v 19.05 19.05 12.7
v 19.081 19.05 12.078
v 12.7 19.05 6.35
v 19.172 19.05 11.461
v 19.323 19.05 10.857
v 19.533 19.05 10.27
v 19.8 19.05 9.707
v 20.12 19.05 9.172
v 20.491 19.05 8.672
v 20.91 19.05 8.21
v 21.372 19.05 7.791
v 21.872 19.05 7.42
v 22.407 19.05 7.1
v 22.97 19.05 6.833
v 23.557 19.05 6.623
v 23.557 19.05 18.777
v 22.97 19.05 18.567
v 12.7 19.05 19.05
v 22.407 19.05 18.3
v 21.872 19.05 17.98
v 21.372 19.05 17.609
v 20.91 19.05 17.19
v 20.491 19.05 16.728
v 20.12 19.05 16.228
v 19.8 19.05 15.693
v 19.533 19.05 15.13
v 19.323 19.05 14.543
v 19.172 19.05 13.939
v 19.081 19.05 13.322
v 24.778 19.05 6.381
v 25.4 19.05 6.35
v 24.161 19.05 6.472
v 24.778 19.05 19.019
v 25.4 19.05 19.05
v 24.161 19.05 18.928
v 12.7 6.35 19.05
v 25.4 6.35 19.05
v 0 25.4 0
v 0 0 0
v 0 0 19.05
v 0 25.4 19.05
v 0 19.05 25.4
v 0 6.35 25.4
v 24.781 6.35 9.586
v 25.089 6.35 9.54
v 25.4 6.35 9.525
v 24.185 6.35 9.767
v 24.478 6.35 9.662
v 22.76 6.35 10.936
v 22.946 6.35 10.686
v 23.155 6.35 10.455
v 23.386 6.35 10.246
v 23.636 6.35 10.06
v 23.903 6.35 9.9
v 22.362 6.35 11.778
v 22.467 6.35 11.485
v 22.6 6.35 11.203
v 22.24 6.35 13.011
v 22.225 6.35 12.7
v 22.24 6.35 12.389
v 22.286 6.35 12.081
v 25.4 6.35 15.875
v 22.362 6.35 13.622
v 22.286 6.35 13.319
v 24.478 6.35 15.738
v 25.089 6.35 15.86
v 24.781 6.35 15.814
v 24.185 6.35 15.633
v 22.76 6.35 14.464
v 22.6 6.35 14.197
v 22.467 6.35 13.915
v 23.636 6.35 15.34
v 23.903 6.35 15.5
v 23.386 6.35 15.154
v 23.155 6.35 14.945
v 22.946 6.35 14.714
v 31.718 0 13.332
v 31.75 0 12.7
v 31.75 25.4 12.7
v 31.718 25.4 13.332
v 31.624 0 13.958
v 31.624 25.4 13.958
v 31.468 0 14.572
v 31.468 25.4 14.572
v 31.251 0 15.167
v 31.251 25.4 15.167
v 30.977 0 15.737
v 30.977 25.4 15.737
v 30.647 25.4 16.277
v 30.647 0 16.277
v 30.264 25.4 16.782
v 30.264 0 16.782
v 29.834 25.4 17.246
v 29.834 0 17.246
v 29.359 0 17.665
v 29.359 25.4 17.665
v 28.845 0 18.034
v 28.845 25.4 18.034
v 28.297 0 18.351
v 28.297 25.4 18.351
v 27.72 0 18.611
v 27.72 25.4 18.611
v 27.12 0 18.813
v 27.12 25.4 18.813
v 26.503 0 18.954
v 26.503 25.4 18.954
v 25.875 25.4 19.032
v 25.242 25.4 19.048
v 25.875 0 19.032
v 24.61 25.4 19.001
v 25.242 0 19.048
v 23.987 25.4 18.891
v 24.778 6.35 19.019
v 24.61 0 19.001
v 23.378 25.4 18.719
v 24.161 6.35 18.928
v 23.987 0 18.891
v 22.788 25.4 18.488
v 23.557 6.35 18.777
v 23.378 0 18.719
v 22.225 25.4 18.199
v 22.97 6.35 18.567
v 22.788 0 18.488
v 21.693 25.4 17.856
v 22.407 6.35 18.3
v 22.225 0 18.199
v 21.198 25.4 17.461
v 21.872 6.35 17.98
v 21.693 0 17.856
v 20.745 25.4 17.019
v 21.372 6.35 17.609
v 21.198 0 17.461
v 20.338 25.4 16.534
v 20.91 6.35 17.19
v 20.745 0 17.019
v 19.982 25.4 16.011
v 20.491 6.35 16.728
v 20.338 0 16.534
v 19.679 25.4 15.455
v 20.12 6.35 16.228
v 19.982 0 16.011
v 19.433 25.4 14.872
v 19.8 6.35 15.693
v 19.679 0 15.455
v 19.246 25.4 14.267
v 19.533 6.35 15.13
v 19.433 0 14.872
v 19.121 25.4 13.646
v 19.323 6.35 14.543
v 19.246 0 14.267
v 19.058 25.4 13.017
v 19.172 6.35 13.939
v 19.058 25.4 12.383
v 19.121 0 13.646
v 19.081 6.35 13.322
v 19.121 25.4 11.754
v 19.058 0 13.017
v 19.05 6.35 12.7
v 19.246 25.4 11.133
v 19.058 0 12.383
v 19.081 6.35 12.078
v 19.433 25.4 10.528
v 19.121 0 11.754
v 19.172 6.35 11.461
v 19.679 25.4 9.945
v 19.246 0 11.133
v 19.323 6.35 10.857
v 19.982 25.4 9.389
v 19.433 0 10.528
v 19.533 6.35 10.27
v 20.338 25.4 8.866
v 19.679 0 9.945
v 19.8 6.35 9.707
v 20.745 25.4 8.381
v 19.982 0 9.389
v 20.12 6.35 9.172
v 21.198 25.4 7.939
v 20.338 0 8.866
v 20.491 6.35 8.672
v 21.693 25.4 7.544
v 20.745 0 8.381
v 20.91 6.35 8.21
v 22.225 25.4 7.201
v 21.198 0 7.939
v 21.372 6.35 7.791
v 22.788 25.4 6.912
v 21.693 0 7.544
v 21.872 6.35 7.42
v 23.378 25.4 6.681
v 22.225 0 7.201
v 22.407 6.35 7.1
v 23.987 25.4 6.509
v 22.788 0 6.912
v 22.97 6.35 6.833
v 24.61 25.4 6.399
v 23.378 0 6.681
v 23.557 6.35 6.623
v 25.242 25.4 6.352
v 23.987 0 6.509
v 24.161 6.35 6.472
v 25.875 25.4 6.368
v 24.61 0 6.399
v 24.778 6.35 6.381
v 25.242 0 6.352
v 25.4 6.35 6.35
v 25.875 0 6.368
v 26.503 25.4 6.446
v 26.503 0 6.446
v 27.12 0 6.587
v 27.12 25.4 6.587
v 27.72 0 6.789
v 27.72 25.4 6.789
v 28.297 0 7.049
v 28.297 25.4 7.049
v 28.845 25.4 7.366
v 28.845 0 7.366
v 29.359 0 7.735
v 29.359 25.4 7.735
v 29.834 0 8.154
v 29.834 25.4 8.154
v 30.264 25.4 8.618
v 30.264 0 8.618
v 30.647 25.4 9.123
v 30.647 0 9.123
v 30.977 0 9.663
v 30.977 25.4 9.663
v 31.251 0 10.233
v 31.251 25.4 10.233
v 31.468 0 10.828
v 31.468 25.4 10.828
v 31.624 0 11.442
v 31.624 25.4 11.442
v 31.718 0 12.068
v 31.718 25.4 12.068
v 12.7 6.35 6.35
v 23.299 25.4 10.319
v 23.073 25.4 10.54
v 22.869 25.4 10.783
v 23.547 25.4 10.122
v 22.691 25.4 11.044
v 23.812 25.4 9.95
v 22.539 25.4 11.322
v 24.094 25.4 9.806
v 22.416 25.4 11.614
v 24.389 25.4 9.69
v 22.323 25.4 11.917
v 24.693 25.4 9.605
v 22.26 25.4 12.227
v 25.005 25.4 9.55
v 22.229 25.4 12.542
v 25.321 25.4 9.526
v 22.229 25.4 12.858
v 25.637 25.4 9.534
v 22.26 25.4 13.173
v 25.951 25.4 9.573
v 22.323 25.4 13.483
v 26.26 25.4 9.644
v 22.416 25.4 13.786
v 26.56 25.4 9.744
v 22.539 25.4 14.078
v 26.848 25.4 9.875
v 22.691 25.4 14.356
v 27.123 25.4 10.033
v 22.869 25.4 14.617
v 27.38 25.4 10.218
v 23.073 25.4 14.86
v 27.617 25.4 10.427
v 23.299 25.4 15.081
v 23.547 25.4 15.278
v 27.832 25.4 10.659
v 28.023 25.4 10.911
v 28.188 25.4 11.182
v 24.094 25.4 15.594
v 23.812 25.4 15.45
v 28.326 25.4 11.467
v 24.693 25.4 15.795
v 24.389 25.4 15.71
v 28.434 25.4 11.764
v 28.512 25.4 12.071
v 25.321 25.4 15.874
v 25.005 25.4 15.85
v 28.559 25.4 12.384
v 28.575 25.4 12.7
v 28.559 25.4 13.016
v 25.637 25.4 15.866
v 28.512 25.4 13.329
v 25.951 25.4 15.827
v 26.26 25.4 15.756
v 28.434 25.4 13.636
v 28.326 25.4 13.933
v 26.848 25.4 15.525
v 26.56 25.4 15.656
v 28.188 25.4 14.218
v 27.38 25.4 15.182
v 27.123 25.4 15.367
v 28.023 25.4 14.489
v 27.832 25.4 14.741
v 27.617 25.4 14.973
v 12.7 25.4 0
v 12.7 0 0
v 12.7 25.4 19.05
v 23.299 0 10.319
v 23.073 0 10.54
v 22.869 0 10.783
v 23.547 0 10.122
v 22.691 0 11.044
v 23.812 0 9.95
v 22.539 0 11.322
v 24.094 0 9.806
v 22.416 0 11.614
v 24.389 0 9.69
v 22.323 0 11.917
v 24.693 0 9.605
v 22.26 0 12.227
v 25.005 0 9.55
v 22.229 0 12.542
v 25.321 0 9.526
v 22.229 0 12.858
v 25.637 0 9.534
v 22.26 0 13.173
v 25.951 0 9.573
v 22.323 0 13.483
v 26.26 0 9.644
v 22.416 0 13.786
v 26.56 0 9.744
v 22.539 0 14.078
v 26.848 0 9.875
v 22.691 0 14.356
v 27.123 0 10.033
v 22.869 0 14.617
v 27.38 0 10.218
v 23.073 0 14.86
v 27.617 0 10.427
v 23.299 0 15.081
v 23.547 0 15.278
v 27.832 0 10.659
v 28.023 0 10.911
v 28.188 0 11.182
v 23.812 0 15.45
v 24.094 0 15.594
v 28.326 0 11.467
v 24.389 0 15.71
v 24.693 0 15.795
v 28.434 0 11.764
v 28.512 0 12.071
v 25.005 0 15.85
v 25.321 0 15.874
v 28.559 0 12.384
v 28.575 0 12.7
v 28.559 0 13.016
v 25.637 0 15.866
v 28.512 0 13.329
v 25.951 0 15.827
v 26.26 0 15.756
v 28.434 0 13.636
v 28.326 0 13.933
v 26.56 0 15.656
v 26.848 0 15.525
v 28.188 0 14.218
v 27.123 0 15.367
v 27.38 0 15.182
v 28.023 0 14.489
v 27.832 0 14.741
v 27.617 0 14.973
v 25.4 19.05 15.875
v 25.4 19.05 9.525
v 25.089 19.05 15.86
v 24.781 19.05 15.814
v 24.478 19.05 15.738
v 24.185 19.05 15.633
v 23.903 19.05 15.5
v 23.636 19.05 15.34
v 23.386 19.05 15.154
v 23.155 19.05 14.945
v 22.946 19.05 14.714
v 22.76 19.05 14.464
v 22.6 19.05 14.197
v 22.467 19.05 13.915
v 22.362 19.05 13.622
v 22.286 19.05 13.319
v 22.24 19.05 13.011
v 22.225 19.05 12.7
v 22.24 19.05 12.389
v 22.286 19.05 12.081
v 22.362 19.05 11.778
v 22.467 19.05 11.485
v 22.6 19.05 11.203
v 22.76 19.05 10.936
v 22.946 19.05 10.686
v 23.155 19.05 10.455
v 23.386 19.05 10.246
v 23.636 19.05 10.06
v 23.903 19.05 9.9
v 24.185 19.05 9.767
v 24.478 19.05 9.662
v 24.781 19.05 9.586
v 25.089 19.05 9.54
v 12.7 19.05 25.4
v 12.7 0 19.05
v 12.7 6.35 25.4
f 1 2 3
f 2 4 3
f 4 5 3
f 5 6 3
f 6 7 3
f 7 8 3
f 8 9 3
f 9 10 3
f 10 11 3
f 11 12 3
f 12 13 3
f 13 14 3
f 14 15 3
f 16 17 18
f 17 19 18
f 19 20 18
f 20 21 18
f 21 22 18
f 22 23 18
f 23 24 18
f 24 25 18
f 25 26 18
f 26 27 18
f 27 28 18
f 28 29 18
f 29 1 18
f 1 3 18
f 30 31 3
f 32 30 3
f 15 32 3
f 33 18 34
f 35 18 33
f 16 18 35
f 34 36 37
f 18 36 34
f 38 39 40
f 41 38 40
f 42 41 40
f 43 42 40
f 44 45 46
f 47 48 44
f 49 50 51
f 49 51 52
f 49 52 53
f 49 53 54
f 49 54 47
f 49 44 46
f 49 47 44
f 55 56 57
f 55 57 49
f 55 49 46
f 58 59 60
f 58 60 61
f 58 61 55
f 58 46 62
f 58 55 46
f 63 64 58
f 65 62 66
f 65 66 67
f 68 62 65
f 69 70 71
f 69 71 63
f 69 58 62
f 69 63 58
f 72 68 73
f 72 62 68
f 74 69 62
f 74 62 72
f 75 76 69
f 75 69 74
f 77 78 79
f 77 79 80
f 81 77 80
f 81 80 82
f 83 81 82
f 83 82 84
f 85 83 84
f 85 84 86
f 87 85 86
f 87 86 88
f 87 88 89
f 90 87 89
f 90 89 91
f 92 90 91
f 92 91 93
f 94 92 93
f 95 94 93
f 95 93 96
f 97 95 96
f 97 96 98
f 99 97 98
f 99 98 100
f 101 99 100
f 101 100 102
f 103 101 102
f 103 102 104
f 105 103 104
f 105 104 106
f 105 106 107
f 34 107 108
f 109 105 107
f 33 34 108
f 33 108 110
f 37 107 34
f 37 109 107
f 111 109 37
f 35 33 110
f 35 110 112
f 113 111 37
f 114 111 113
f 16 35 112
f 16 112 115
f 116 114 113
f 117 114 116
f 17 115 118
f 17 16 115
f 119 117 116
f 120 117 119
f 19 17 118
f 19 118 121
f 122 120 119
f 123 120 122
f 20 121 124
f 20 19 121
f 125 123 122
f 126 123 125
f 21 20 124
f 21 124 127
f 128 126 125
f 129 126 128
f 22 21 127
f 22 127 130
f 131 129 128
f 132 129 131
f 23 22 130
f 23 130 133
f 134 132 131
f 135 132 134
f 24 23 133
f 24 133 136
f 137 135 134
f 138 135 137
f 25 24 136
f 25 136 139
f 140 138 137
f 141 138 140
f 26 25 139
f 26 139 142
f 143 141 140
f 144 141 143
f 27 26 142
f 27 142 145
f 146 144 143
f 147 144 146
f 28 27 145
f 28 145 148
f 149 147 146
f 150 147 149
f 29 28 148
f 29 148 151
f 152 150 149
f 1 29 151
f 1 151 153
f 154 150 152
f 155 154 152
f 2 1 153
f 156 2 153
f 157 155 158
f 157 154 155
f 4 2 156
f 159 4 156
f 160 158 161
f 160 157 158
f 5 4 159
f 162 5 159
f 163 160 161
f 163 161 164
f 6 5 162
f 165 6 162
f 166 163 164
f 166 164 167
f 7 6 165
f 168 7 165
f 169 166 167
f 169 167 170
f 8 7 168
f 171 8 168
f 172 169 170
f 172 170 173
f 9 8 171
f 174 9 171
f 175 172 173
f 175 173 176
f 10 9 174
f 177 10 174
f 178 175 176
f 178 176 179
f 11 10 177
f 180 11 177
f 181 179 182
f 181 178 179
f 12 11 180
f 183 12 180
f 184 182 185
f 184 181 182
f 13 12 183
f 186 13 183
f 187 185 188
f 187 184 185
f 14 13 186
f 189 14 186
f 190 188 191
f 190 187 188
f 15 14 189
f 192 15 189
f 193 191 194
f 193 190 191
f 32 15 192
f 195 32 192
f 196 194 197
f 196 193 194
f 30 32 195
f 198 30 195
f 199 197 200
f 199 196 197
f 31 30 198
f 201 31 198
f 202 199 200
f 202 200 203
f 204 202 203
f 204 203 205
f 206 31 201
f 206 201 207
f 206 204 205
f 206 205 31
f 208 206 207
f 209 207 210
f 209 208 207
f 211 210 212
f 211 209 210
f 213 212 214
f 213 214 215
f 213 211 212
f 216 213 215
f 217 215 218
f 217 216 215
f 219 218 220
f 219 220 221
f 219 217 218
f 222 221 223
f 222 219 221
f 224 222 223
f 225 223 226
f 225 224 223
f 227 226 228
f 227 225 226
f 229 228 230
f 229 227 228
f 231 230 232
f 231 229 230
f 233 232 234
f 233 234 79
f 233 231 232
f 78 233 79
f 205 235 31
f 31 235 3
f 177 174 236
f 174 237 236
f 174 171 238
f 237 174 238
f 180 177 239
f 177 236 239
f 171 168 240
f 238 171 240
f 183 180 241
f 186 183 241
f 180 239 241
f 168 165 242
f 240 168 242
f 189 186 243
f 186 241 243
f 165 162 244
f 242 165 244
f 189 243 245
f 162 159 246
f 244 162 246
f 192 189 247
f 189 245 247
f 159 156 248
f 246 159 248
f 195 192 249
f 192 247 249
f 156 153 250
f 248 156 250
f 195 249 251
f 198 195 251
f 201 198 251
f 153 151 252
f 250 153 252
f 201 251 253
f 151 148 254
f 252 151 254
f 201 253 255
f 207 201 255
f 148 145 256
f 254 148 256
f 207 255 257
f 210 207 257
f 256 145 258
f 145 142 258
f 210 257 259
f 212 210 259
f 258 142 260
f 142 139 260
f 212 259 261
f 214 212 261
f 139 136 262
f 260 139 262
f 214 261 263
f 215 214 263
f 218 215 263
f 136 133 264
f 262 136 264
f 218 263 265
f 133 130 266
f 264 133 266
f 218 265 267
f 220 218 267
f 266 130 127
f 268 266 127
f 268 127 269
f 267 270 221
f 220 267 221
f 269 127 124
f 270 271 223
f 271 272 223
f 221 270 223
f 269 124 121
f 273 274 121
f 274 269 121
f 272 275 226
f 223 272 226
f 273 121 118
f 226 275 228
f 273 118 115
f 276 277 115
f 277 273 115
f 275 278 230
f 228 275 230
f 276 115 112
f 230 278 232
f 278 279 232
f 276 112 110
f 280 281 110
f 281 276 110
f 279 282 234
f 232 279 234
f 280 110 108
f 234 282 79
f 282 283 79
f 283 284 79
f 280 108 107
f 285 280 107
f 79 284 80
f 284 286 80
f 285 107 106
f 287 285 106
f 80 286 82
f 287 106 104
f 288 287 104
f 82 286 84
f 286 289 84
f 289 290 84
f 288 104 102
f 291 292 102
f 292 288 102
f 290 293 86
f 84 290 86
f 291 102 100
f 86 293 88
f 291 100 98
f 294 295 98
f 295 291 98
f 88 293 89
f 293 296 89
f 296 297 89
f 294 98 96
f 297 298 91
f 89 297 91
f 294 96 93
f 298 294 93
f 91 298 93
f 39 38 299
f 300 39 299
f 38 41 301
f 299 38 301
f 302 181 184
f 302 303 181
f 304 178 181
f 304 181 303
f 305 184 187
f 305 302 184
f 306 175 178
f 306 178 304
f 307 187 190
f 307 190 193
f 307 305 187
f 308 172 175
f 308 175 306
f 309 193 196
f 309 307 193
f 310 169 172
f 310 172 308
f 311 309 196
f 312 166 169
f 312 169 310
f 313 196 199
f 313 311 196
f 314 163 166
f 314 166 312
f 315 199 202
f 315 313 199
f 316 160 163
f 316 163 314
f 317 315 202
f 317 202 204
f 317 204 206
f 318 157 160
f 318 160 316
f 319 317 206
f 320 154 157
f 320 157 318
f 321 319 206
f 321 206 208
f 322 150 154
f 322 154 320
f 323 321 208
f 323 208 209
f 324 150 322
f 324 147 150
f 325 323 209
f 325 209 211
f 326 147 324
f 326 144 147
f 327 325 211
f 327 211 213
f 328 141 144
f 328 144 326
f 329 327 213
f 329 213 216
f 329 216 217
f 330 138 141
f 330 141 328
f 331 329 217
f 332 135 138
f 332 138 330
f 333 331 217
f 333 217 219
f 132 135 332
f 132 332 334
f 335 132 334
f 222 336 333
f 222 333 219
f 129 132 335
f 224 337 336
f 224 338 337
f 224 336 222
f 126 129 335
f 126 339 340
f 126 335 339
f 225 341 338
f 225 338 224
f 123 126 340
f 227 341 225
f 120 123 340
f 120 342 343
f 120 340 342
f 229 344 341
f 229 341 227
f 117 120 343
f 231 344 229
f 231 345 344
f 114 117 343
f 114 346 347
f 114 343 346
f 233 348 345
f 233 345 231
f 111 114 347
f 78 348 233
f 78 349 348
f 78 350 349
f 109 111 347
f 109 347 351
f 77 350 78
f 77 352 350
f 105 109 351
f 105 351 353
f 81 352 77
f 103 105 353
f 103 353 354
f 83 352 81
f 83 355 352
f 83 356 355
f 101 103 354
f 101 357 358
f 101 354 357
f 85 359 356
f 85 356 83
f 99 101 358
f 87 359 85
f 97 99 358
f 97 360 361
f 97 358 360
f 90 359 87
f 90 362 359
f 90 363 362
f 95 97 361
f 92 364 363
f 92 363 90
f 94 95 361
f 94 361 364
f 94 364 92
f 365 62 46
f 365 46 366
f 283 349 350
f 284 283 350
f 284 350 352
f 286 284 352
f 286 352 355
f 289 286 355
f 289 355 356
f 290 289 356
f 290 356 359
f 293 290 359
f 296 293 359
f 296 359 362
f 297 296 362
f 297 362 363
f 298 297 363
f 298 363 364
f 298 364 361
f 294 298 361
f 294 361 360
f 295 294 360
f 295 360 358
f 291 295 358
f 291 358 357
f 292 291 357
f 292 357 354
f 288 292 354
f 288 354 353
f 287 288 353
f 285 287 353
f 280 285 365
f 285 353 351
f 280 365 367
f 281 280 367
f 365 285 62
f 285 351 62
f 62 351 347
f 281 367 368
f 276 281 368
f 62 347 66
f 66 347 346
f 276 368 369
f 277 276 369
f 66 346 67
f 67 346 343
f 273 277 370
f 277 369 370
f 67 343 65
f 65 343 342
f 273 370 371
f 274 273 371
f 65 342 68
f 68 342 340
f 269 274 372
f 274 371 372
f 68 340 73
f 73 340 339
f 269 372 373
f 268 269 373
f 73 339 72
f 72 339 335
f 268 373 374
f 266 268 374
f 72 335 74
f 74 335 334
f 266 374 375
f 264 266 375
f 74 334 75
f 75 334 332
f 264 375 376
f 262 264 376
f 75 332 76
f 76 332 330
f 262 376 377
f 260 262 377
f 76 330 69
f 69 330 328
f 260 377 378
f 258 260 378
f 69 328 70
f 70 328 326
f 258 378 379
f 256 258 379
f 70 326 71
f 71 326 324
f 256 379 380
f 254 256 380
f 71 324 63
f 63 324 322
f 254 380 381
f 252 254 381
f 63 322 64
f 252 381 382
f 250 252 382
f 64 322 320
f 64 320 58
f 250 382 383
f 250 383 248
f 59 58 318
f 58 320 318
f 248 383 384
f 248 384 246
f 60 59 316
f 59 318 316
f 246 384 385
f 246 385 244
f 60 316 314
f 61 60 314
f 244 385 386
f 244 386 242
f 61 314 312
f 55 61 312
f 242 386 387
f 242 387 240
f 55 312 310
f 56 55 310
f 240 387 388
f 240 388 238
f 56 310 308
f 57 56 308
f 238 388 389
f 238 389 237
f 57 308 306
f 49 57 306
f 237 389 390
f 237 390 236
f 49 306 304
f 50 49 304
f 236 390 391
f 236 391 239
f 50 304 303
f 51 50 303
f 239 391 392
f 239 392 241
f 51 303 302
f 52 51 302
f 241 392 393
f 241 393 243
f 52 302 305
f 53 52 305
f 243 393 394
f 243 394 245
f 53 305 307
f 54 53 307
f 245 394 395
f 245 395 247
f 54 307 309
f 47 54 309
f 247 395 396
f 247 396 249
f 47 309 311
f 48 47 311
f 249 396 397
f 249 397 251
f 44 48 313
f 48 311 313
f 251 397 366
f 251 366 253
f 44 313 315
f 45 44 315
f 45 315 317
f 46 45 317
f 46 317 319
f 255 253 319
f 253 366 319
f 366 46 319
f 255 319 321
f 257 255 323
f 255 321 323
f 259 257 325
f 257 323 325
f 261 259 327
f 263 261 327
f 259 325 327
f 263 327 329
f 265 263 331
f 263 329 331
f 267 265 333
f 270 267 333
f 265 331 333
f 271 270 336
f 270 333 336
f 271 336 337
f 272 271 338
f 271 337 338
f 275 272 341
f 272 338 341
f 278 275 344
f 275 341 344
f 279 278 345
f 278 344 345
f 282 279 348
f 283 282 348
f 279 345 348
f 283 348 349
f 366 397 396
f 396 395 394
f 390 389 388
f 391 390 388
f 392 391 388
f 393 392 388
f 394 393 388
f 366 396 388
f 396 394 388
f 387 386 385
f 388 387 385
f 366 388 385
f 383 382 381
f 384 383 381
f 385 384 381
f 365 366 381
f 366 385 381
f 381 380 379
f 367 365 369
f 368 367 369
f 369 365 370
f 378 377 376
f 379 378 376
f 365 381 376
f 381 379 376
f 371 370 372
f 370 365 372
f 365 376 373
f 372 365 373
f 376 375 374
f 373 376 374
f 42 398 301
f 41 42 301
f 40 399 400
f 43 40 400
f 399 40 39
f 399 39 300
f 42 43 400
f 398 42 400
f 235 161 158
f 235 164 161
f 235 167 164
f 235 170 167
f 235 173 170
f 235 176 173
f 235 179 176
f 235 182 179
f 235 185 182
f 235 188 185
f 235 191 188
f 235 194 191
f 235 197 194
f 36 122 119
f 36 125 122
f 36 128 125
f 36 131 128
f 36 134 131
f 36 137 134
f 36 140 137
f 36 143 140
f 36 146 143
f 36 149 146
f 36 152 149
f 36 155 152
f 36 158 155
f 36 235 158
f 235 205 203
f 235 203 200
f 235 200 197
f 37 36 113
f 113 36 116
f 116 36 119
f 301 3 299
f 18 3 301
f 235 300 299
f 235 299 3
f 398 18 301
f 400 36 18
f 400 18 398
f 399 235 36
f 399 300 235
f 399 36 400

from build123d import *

# Parameters (mm, degrees)
F0_W     = 12.7
F0_H     = 25.4
F1_DEPTH = 25.4
F3_DEPTH = 12.7
F4_W     = 12.7
F4_H     = 12.7
F5_DEPTH = 12.7
F6_R     = 6.35
F6_R_2   = 3.175
F7_DEPTH = 25.4


with BuildPart() as f1:
    # F0 (on Front) → F1 (new body)
    with BuildSketch(Plane.XZ):
        with Locations((6.35, 12.7)):
            Rectangle(F0_W, F0_H)
    extrude(amount=-F1_DEPTH)

    # F2 (on face) → F3 (cut)
    with BuildSketch(Plane.YZ.offset(12.7)):
        Polygon((6.35, 25.4), (0, 25.4), (0, 19.05), align=None)
        Polygon((25.4, 25.4), (19.05, 25.4), (25.4, 19.05), align=None)
    extrude(amount=-F3_DEPTH, mode=Mode.SUBTRACT)

    # F4 (on face) → F5 (join)
    with BuildSketch(Plane.YZ.offset(12.7)):
        with Locations((12.7, 12.7)):
            Rectangle(F4_W, F4_H)
    extrude(amount=F5_DEPTH)

    # F6 (on Front) → F7 (join)
    with BuildSketch(Plane.XZ):
        with Locations((25.4, 12.7)):
            Circle(F6_R)
        with Locations((25.4, 12.7)):
            Circle(F6_R_2, mode=Mode.SUBTRACT)
    extrude(amount=-F7_DEPTH)


solid = f1.part
